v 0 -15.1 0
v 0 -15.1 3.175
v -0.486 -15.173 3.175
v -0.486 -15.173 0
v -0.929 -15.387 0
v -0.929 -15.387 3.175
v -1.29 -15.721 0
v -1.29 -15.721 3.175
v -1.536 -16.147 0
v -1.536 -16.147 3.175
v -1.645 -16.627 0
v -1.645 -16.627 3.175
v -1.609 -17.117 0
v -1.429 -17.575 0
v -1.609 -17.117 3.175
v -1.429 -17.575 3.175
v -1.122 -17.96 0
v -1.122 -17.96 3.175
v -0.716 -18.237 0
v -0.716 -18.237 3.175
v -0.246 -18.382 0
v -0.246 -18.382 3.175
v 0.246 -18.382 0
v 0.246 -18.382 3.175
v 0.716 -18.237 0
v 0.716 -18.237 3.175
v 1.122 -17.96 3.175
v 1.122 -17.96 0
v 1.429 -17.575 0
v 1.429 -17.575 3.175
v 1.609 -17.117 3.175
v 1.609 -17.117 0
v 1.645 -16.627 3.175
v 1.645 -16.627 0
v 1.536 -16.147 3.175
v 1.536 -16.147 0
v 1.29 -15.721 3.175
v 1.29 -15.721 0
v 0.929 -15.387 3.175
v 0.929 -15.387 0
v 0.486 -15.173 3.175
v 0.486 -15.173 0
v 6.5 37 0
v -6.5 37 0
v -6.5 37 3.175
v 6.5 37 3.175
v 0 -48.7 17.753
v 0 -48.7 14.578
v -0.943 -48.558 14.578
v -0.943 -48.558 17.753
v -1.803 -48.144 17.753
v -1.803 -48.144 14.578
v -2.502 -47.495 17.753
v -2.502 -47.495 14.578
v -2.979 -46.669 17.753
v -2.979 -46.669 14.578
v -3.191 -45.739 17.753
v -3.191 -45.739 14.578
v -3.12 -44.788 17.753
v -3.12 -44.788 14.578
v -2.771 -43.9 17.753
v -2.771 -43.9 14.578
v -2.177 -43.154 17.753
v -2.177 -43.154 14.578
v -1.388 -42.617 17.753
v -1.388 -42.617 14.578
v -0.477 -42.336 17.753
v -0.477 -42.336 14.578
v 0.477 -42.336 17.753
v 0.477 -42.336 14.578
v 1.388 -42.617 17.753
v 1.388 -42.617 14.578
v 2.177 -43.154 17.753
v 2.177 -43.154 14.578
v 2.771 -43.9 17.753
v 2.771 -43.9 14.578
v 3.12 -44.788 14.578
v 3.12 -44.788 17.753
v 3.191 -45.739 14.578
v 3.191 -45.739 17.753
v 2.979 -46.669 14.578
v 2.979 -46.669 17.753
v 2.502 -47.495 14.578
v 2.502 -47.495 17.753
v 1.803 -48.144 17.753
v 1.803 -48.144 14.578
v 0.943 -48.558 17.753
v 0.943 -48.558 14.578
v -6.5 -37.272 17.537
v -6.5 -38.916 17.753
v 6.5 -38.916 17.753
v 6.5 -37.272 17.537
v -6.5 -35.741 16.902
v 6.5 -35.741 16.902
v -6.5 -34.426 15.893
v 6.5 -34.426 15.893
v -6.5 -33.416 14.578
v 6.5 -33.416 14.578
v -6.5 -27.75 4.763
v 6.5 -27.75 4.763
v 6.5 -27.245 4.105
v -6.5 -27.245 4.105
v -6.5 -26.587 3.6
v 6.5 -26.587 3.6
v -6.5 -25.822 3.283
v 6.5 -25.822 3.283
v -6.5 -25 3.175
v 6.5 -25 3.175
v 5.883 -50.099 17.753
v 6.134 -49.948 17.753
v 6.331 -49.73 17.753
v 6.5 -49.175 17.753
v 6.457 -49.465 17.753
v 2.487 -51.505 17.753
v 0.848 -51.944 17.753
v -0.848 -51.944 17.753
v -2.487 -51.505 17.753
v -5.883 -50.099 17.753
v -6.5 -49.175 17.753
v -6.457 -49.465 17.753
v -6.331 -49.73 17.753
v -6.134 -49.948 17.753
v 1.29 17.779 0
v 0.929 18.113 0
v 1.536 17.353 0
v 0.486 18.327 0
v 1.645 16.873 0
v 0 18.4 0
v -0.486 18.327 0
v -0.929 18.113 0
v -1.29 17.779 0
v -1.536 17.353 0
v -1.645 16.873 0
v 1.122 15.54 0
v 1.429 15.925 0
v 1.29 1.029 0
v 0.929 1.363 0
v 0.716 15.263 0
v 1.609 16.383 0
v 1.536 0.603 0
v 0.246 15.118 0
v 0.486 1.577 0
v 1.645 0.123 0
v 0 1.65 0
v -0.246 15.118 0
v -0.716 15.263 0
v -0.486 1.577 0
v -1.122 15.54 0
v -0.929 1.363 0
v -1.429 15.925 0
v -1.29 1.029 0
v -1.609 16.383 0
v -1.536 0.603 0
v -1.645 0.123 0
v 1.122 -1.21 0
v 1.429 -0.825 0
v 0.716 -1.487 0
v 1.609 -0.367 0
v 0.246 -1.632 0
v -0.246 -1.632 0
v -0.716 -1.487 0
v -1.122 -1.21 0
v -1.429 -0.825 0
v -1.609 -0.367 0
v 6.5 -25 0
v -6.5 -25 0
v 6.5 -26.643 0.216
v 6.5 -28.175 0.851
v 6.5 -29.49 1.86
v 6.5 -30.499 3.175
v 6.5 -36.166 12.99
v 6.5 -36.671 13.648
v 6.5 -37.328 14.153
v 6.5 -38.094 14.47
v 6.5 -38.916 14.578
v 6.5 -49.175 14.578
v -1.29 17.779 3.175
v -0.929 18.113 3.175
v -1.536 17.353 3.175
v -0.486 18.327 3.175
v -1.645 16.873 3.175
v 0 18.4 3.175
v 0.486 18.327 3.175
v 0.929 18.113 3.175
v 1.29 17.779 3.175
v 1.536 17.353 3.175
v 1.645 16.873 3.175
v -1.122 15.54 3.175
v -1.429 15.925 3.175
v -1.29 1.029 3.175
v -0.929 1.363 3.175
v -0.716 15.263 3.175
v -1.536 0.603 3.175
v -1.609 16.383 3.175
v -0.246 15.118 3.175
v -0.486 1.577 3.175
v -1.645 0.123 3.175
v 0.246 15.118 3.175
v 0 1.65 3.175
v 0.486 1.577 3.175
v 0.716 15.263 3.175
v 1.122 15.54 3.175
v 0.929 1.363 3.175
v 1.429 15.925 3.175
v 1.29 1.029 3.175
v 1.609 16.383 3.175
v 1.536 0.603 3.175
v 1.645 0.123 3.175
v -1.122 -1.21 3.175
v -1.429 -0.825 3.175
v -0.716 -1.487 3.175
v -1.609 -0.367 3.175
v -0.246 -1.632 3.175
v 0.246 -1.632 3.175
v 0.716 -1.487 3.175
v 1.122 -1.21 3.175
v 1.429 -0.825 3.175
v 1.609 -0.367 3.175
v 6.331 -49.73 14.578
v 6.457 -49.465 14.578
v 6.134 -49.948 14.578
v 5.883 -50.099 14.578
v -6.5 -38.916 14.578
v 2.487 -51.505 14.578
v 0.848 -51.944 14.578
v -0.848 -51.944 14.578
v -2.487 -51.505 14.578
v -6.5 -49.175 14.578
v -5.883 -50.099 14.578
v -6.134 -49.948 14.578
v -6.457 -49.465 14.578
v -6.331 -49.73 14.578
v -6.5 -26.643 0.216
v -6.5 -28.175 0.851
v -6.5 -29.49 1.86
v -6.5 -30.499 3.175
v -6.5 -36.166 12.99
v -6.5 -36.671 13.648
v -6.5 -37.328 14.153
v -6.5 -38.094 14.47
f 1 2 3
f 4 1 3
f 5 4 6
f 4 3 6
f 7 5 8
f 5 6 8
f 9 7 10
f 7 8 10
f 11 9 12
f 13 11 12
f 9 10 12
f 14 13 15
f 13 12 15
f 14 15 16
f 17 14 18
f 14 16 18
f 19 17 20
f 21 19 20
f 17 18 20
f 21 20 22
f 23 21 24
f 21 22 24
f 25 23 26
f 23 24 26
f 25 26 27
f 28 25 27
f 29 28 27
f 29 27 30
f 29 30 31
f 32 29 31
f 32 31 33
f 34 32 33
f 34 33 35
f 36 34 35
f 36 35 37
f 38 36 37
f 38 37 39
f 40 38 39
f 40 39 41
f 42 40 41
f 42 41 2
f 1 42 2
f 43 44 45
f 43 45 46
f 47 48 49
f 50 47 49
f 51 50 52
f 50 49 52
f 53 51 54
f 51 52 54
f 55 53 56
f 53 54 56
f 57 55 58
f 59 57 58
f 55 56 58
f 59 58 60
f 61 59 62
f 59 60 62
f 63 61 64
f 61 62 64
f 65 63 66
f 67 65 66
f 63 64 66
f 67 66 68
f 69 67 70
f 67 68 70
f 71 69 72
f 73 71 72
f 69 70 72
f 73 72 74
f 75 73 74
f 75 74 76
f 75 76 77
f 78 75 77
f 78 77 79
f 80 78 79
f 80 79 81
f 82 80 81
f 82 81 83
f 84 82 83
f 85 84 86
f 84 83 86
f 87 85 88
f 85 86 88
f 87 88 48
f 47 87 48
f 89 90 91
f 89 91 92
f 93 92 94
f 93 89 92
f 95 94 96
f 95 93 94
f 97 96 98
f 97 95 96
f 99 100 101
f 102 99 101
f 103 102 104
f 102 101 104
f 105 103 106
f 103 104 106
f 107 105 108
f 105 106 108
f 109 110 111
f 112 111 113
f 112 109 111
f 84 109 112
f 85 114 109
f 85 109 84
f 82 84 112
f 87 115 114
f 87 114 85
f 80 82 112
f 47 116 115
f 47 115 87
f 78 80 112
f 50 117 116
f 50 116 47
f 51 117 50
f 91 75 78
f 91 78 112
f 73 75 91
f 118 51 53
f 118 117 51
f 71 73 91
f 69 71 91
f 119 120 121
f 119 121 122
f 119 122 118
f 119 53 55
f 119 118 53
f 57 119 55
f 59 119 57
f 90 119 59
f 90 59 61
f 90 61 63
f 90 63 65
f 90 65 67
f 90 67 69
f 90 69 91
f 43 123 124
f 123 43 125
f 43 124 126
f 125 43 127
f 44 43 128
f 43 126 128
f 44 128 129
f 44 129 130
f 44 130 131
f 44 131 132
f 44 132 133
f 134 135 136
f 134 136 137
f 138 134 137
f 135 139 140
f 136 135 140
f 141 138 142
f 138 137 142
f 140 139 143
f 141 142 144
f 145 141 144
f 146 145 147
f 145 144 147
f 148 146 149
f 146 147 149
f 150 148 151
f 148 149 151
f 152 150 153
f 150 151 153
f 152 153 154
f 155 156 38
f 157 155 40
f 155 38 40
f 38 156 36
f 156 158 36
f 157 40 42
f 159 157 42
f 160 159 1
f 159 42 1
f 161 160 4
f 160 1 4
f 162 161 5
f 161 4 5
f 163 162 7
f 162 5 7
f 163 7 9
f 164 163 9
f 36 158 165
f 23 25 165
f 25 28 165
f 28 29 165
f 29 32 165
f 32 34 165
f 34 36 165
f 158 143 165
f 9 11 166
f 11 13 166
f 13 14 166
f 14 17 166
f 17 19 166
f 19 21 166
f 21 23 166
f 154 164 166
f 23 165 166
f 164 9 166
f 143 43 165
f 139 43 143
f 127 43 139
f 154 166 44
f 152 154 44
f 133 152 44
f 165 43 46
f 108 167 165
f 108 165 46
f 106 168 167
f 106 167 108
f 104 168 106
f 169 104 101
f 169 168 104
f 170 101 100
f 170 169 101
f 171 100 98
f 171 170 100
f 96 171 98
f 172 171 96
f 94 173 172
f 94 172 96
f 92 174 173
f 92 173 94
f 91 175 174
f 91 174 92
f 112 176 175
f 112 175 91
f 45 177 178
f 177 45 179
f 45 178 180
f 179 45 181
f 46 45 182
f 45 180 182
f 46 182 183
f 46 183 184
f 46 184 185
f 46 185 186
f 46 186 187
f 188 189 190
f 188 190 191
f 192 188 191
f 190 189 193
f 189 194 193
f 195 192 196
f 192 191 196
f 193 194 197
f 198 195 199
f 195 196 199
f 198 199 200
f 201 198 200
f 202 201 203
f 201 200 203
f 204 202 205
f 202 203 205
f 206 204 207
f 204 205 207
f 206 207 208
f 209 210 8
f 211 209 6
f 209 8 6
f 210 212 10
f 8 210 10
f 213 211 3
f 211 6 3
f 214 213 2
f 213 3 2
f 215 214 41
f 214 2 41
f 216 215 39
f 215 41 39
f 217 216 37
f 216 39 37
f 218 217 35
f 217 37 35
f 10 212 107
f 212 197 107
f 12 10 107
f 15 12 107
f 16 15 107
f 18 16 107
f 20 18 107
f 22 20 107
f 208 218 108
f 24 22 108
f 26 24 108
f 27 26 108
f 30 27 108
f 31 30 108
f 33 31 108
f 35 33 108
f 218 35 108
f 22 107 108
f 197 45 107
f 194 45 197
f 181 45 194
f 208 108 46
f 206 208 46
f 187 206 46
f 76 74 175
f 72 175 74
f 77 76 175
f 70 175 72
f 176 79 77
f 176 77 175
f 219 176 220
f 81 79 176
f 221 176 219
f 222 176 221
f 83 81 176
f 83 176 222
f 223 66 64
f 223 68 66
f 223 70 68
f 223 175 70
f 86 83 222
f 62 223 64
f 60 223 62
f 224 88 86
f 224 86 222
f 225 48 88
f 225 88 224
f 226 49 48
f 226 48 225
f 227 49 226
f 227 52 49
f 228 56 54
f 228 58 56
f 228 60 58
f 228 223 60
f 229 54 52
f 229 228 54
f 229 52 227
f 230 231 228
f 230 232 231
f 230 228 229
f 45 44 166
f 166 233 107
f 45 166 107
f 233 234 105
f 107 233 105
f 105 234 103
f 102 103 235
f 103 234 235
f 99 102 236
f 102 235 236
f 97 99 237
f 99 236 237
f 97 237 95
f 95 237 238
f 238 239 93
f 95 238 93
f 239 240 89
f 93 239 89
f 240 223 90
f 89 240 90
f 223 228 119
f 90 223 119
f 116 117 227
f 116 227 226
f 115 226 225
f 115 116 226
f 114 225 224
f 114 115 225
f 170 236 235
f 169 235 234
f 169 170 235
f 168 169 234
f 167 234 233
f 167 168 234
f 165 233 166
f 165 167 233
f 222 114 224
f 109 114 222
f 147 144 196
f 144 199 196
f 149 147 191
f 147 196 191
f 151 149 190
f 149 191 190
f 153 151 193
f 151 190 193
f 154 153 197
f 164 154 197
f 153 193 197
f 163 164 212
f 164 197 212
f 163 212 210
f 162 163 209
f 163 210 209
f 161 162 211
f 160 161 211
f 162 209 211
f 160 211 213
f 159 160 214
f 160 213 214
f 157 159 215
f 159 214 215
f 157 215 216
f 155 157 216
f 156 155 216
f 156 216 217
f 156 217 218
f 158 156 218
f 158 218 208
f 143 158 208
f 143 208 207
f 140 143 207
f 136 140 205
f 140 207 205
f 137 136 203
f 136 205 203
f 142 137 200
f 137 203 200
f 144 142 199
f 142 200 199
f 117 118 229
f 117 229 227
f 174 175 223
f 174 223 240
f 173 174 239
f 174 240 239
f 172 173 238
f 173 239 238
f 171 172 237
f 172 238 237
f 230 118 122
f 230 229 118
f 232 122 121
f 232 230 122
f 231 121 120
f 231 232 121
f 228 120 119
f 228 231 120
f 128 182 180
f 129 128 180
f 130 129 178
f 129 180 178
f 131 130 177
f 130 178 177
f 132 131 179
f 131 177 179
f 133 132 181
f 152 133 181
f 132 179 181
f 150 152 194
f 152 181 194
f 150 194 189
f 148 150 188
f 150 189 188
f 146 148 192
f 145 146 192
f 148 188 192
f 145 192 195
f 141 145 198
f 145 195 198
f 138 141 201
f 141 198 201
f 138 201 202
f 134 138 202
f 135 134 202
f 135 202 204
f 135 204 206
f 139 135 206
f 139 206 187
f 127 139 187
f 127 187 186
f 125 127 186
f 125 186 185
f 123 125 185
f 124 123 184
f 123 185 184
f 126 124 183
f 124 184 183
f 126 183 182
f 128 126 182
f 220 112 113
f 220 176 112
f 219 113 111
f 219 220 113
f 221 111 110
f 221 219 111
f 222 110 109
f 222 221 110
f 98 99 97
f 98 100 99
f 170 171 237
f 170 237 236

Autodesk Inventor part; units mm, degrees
ref_plane "YZ Plane" through (0, 0, 0) normal (1, 0, 0) x (0, 1, 0)
ref_plane "XZ Plane" through (0, 0, 0) normal (0, 1, 0) x (-1, 0, 0)
ref_plane "XY Plane" through (0, 0, 0) normal (0, 0, 1) x (1, 0, 0)
sketch "Sketch1" plane through (0, 0, 0) normal (0, 0, 1) x (1, 0, 0)
  line L0 (6.5, -25) -> (-6.5, -25)
  line L1 (-6.5, -25) -> (-6.5, 25)
  line L2 (-6.5, 25) -> (6.5, 25)
  line L3 (6.5, 25) -> (6.5, -25)
  line L4 (6.5, -25) -> (-6.5, 25) construction
  line L5 (-6.5, -25) -> (6.5, 25) construction
  line L6 (0, 16.75) -> (0, -16.75) construction
  point P0 (0, 0)
  dimension "d0" = 50
  dimension "d1" = 13
  dimension "d2" = 33.5
extrude "Plate1" add sketch "Sketch1" along normal blind 3.175
hole "Hole1" at (0, 0, 0) at (0, 16.75, 0) at (0, -16.75, 0) direction (0, 0, 1) diameter 3.3 end through all
sketch "Sketch2" plane through (6.5, -27.7496, 4.7625) normal (0, -0.8660254, -0.5) x (1, 0, 0)
  line L0 (-13, 0) -> (0, 0)
  line L1 (0, 0) -> (0, 11.3338)
  line L2 (0, 11.3338) -> (-13, 11.3338)
  line L3 (-13, 11.3338) -> (-13, 0)
edge flange "Flange1" height 15 angle 60 thickness 3.175 bend radius 3.175 thickness toward (0, -0.8660254, -0.5) relief tear relief width 3.175 relief depth 1.5875 edges at (0, -25, 3.175) wall of the first edge with corners at (-6.5, -27.7496, 4.7625) (6.5, -27.7496, 4.7625) (6.5, -33.4165, 14.5779) (-6.5, -33.4165, 14.5779)
bend "Bend1"
corner "Corner1"
sketch "Sketch3" plane through (-6.5, -38.9158, 14.5779) normal (0, 0, 1) x (1, 0, 0)
  line L0 (13, 0) -> (0, 0)
  line L1 (0, 0) -> (0, -16.3338)
  line L2 (0, -16.3338) -> (13, -16.3338)
  line L3 (13, -16.3338) -> (13, 0)
edge flange "Flange2" height 20 angle 60 thickness 3.175 bend radius 3.175 thickness toward (0, 0, 1) relief tear relief width 3.175 relief depth 1.5875 edges at (0, -36.1662, 12.9904) wall of the first edge with corners at (6.5, -38.9158, 14.5779) (-6.5, -38.9158, 14.5779) (-6.5, -55.2496, 14.5779) (6.5, -55.2496, 14.5779)
bend "Bend2"
corner "Corner2"
sketch "Sketch4" plane through (-6.5, 25, 0) normal (0, 1, 0) x (1, 0, 0)
  line L0 (0, -3.175) -> (13, -3.175) projected
  line L1 (13, 0) -> (13, -3.175) projected
  line L2 (13, 0) -> (0, 0) projected
  line L3 (0, 0) -> (0, -3.175) projected
  point P0 (6.5, 0)
extrude "Extrusion1" add sketch "Sketch4" along normal blind 12
sketch "Sketch5" plane through (-6.5, -55.2496, 17.7529) normal (0, 0, 1) x (1, 0, 0)
  circle A0 centre (6.5, 9.7496) radius 6.5
  line L0 (0, 0) -> (0, 16.3338) construction
  line L1 (0, 9.7496) -> (0, 5.4065)
  line L2 (0, 5.4065) -> (6.5, 2.7141)
  line L3 (6.5, 2.7141) -> (13, 5.4065)
  line L4 (13, 5.4065) -> (13, 9.7496)
  line L5 (13, 16.3338) -> (13, 0) construction
  line L6 (13, 16.3338) -> (0, 16.3338) projected
  line L7 (0, 0) -> (0, 16.3338) projected
  line L8 (13, 0) -> (0, 0) projected
  line L9 (13, 16.3338) -> (13, 0) projected
  point P0 (6.5, 55.2496)
  point P1 (13, 5.4065)
  point P2 (8.9874, 3.7444)
  point P3 (4.0126, 3.7444)
  point P4 (0, 5.4065)
  dimension "d33" = 45.5
  dimension "d34" = 135
extrude "Extrusion2" cut sketch "Sketch5" against normal through all contours L3 L2 A0 | L3 L9 L8 L7 L2
fillet "Fillet1" radius 1 2 edges at (-6.5, -49.8432, 16.1654) (6.5, -49.8432, 16.1654)
sketch "Sketch6" plane through (-6.5, -38.9158, 17.7529) normal (0, 0, 1) x (1, 0, 0)
  arc A0 (4.0126, -12.5894) -> (8.9874, -12.5894) centre (6.5, -6.5842) ccw projected
  point P0 (6.5, 38.9158)
hole "Hole2" at (0, -45.5, 17.7529) direction (0, 0, -1) diameter 6.4 end through all
equation "\"d9\" = Thickness"
equation "\"d43\" = Thickness"
equation "\"d3\" = Thickness"
equation "\"d11\" = BendReliefWidth"
equation "\"d12\" = BendReliefDepth"
equation "\"d13\" = MinimumRemnant"
equation "\"d14\" = TransitionRadius"
equation "\"d17\" = BendRadius"
equation "\"d18\" = CornerReliefSize"
equation "\"d19\" = GapSize"
equation "\"d20\" = JacobiRadiusSize"
equation "\"d21\" = BendReliefWidth"
equation "\"d22\" = BendReliefDepth"
equation "\"d23\" = MinimumRemnant"
equation "\"d24\" = TransitionRadius"
equation "\"d27\" = BendRadius"
equation "\"d28\" = CornerReliefSize"
equation "\"d29\" = GapSize"
equation "\"d30\" = JacobiRadiusSize"
equation "\"BendReliefWidth\" = Thickness"
equation "\"BendReliefDepth\" = 0.5 * Thickness"
equation "\"CornerReliefSize\" = 4 * Thickness"
equation "\"MinimumRemnant\" = 2 * Thickness"
equation "\"TransitionRadius\" = BendRadius"
equation "\"JacobiRadiusSize\" = BendRadius"
equation "\"GapSize\" = Thickness"
equation "\"Thickness\" = 3.175"
equation "\"BendRadius\" = 3.175"
properties part number "Printhead Endstop Cable Guide Plate" material "Aluminum 6061"
